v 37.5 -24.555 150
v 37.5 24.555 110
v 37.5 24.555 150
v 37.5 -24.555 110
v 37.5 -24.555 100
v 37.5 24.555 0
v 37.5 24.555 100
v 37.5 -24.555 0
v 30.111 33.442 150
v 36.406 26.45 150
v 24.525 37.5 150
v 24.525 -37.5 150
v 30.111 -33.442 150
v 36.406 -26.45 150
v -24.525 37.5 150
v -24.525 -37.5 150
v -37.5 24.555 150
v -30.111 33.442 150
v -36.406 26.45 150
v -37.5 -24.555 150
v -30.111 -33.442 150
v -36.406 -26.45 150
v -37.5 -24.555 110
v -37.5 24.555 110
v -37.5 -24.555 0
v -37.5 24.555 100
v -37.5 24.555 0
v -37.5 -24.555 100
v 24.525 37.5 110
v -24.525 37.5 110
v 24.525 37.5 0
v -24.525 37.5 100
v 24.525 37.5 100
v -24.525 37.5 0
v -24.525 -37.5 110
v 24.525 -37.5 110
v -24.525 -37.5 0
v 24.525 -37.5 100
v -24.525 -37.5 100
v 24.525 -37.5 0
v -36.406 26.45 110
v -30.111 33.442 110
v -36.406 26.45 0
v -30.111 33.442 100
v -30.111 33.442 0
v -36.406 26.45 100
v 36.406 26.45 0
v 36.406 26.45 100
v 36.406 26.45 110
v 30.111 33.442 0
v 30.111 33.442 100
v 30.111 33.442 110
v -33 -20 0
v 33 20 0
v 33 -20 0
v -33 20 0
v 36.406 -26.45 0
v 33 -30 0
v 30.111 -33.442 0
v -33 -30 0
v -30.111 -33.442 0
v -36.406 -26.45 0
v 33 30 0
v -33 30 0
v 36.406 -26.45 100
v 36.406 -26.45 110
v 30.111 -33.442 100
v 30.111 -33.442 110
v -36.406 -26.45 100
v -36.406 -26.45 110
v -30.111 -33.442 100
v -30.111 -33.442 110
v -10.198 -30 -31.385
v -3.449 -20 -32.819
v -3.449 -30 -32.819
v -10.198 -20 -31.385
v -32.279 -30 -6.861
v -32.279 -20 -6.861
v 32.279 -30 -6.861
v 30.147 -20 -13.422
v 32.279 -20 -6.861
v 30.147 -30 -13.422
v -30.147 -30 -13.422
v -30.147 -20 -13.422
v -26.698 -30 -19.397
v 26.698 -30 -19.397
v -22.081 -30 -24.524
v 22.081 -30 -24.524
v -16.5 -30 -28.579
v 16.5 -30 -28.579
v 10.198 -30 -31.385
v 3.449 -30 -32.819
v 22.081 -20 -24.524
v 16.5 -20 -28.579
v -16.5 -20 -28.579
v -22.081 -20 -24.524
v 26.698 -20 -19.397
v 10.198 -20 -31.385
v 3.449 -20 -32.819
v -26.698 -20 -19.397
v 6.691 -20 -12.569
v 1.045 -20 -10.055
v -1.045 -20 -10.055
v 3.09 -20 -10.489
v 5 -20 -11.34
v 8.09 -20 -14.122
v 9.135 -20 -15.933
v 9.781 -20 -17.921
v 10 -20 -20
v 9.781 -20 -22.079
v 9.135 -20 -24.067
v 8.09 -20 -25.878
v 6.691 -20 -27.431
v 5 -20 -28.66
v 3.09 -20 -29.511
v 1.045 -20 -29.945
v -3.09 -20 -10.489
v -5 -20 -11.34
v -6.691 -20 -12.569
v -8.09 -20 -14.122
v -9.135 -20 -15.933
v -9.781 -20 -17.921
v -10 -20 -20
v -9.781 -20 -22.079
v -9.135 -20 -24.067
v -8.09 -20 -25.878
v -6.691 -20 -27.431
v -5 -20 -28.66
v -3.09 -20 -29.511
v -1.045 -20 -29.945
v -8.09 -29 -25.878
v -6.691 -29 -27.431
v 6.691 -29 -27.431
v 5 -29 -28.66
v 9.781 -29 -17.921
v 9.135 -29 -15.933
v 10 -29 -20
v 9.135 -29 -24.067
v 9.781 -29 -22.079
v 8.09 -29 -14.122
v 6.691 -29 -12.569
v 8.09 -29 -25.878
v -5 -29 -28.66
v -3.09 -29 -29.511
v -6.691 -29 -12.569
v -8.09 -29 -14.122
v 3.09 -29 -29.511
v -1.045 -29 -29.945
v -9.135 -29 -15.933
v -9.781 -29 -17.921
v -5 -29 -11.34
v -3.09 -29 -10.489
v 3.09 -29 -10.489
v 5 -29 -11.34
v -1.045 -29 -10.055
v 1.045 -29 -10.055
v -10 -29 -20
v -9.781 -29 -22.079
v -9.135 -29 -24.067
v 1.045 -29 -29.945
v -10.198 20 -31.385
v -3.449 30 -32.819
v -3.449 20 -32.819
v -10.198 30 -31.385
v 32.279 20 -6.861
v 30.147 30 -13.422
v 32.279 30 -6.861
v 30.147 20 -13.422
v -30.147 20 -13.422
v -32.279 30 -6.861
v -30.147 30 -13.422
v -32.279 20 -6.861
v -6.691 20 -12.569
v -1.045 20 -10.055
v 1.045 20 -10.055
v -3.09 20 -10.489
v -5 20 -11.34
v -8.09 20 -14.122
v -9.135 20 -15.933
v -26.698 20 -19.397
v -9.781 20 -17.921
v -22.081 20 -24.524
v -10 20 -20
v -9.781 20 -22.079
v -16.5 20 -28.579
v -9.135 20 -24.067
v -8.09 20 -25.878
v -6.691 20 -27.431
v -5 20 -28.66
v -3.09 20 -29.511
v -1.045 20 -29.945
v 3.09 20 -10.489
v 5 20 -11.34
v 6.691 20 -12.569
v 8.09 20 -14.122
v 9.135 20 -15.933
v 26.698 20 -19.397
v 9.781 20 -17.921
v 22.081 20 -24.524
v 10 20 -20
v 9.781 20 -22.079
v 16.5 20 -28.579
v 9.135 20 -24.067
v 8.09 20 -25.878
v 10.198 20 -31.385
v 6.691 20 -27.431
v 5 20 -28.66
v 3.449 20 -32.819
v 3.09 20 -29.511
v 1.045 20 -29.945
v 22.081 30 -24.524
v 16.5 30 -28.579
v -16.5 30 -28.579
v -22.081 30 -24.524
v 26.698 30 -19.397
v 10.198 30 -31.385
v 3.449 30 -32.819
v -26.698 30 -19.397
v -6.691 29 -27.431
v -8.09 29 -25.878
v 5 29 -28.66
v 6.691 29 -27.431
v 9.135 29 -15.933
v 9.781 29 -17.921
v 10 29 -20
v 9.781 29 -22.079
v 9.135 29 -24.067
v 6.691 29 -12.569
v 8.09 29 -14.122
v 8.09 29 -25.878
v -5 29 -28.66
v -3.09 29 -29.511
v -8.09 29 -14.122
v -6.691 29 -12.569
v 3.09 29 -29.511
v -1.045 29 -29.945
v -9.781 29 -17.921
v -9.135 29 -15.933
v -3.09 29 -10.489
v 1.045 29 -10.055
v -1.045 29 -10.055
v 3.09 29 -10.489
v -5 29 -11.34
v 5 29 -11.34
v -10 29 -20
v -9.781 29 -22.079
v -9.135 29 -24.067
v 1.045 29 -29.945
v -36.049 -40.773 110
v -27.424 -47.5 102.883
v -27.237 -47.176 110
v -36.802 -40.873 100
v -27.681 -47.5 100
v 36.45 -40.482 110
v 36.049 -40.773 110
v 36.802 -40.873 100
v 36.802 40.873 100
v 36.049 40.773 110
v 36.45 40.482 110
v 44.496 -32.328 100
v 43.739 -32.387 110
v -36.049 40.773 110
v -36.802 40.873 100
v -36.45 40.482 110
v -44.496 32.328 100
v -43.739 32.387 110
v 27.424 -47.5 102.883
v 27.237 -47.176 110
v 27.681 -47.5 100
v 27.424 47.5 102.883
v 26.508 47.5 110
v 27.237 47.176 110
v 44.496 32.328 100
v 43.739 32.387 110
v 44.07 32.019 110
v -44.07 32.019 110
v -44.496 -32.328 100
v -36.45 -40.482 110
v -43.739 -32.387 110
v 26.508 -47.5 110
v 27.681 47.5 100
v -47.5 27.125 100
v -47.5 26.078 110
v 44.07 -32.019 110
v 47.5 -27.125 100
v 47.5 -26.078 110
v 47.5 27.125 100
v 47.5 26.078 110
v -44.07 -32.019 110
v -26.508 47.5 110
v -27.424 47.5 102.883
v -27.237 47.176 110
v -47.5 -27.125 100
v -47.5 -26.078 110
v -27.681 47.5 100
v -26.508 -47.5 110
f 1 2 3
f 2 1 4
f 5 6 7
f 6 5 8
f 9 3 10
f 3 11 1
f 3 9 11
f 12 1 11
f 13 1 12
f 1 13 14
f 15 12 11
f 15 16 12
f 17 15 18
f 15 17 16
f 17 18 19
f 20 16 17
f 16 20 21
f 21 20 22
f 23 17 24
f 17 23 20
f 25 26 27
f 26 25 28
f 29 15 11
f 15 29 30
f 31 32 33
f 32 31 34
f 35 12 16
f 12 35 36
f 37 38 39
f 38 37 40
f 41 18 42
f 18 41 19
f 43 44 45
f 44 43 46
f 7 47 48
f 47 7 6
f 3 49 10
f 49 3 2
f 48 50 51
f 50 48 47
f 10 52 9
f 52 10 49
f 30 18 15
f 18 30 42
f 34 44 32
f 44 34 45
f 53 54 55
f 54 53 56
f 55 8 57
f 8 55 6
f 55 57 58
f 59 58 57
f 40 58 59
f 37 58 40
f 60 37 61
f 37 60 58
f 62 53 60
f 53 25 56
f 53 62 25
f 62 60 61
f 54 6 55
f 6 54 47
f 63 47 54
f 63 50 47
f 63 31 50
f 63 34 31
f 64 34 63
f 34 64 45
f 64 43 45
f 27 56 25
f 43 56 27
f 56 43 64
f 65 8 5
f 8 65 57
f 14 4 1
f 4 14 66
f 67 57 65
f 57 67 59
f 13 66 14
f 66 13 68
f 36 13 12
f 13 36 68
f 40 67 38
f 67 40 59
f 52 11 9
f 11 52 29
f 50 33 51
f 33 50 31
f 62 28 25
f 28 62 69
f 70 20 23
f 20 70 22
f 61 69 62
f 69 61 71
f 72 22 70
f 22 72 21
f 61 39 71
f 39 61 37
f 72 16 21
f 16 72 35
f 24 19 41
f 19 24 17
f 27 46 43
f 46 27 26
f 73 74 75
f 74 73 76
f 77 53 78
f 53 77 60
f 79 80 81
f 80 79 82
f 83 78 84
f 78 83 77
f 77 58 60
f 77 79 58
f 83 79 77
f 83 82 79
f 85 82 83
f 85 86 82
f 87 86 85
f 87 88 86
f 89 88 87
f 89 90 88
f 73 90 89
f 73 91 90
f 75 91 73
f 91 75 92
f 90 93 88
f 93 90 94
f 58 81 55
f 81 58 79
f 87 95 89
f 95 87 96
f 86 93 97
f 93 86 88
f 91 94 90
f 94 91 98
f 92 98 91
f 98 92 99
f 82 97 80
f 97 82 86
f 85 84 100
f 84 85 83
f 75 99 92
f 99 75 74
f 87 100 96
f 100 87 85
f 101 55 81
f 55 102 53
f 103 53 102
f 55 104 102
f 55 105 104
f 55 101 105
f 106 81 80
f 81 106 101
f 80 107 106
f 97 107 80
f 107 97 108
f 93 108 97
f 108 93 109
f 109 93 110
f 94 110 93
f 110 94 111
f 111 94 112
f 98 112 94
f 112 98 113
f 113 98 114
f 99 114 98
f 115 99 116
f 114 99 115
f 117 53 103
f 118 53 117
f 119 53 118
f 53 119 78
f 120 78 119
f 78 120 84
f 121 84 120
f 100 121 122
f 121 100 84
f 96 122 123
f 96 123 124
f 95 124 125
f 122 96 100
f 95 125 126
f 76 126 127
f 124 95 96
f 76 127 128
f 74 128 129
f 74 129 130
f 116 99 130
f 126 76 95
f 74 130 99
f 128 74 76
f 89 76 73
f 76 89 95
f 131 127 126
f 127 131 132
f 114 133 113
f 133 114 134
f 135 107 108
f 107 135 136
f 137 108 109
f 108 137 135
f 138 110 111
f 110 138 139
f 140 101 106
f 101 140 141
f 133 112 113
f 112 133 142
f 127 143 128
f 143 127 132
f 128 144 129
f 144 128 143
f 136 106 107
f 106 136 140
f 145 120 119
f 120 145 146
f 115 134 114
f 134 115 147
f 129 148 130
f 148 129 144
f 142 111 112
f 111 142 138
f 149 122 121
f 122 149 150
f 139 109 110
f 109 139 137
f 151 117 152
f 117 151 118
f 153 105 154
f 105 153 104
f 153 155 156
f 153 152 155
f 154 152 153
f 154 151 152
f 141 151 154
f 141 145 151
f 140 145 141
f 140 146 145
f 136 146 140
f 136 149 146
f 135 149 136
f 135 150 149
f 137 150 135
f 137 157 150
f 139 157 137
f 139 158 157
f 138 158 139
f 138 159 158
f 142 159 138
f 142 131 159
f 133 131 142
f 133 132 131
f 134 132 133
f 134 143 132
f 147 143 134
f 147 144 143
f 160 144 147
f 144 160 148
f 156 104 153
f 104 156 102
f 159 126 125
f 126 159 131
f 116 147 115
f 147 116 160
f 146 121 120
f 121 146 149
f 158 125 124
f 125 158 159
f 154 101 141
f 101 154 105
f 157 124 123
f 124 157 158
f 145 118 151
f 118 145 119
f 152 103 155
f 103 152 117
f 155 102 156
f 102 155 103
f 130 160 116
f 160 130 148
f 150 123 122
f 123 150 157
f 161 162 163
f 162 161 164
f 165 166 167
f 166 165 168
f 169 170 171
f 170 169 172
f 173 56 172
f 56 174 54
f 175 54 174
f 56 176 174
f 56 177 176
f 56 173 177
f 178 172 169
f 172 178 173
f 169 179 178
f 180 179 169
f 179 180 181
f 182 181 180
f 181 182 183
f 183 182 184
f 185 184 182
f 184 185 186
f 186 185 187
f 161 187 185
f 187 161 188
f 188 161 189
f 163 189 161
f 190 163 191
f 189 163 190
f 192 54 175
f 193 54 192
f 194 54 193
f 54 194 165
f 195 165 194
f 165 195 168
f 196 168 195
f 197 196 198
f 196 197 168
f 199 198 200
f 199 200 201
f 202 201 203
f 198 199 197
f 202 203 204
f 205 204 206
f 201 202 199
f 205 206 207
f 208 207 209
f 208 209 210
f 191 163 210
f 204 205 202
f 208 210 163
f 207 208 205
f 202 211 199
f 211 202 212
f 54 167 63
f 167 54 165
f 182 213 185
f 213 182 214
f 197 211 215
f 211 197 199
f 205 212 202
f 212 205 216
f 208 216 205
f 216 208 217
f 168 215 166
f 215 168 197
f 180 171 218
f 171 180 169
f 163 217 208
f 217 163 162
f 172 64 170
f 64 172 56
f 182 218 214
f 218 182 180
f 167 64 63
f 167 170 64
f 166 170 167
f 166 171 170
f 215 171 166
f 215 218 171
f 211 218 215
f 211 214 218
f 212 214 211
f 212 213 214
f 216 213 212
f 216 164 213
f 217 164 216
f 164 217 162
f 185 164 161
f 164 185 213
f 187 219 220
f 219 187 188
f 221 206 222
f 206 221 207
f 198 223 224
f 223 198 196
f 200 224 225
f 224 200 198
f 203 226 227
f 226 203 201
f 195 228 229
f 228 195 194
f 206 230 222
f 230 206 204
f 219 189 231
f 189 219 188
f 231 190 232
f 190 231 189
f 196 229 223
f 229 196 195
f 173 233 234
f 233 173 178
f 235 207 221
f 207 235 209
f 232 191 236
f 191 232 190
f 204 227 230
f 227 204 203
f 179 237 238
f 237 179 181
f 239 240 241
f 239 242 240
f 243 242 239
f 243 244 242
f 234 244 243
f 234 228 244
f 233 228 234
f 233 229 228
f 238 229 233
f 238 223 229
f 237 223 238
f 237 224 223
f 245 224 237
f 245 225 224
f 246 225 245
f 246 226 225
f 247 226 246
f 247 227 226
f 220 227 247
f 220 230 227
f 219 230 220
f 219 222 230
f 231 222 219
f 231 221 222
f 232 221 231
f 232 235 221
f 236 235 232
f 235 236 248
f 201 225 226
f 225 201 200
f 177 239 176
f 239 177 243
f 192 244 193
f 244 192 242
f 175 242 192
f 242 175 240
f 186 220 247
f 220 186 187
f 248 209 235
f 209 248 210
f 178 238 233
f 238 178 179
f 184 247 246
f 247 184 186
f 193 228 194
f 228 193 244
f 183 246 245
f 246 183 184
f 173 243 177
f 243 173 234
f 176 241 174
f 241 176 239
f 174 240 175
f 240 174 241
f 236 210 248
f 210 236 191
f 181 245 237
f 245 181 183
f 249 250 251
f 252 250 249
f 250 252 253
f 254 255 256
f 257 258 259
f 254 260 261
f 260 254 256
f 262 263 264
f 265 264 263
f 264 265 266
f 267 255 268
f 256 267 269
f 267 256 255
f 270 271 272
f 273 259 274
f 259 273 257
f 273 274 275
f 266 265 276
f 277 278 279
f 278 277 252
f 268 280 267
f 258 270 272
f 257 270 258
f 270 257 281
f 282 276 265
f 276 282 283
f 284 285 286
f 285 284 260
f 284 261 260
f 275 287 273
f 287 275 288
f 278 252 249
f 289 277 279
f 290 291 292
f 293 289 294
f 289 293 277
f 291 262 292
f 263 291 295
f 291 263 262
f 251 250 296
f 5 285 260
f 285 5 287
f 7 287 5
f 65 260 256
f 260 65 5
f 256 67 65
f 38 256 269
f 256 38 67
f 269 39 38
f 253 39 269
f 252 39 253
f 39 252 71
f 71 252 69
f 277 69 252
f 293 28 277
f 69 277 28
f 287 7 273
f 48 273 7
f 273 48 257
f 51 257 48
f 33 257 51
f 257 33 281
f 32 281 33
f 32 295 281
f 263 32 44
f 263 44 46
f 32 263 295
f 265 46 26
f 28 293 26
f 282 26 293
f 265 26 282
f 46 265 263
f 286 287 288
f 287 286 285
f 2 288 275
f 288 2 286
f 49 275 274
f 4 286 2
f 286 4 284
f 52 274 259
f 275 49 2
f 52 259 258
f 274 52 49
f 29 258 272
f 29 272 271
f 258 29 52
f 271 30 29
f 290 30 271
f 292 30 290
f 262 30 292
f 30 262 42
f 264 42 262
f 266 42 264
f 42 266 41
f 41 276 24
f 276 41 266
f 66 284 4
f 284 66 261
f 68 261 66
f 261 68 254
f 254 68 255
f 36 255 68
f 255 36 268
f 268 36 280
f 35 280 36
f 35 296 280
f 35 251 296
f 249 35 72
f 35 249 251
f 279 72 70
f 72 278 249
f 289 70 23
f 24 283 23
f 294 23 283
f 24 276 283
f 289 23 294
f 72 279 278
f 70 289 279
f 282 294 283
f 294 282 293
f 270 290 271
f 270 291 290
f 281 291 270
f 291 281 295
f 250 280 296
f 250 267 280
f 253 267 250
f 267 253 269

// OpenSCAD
intersection(){
cube([75, 75, 300], center = true);
cylinder(150,45,45);

}

difference(){
    translate([0,-20,0]) rotate([90,0,0])cylinder(10,33,33);
    #translate([0,-19,-20]) rotate([90,0,0])cylinder(10,10,10);
}

difference(){
    translate([0,30,0]) rotate([90,0,0])cylinder(10,33,33);
    translate([0,29,-20]) rotate([90,0,0])cylinder(10,10,10);

}

intersection(){
    translate([0,0,100])cylinder(190,55,45);
    translate([0,0,100])cube([95,95,20], center = true);
}
